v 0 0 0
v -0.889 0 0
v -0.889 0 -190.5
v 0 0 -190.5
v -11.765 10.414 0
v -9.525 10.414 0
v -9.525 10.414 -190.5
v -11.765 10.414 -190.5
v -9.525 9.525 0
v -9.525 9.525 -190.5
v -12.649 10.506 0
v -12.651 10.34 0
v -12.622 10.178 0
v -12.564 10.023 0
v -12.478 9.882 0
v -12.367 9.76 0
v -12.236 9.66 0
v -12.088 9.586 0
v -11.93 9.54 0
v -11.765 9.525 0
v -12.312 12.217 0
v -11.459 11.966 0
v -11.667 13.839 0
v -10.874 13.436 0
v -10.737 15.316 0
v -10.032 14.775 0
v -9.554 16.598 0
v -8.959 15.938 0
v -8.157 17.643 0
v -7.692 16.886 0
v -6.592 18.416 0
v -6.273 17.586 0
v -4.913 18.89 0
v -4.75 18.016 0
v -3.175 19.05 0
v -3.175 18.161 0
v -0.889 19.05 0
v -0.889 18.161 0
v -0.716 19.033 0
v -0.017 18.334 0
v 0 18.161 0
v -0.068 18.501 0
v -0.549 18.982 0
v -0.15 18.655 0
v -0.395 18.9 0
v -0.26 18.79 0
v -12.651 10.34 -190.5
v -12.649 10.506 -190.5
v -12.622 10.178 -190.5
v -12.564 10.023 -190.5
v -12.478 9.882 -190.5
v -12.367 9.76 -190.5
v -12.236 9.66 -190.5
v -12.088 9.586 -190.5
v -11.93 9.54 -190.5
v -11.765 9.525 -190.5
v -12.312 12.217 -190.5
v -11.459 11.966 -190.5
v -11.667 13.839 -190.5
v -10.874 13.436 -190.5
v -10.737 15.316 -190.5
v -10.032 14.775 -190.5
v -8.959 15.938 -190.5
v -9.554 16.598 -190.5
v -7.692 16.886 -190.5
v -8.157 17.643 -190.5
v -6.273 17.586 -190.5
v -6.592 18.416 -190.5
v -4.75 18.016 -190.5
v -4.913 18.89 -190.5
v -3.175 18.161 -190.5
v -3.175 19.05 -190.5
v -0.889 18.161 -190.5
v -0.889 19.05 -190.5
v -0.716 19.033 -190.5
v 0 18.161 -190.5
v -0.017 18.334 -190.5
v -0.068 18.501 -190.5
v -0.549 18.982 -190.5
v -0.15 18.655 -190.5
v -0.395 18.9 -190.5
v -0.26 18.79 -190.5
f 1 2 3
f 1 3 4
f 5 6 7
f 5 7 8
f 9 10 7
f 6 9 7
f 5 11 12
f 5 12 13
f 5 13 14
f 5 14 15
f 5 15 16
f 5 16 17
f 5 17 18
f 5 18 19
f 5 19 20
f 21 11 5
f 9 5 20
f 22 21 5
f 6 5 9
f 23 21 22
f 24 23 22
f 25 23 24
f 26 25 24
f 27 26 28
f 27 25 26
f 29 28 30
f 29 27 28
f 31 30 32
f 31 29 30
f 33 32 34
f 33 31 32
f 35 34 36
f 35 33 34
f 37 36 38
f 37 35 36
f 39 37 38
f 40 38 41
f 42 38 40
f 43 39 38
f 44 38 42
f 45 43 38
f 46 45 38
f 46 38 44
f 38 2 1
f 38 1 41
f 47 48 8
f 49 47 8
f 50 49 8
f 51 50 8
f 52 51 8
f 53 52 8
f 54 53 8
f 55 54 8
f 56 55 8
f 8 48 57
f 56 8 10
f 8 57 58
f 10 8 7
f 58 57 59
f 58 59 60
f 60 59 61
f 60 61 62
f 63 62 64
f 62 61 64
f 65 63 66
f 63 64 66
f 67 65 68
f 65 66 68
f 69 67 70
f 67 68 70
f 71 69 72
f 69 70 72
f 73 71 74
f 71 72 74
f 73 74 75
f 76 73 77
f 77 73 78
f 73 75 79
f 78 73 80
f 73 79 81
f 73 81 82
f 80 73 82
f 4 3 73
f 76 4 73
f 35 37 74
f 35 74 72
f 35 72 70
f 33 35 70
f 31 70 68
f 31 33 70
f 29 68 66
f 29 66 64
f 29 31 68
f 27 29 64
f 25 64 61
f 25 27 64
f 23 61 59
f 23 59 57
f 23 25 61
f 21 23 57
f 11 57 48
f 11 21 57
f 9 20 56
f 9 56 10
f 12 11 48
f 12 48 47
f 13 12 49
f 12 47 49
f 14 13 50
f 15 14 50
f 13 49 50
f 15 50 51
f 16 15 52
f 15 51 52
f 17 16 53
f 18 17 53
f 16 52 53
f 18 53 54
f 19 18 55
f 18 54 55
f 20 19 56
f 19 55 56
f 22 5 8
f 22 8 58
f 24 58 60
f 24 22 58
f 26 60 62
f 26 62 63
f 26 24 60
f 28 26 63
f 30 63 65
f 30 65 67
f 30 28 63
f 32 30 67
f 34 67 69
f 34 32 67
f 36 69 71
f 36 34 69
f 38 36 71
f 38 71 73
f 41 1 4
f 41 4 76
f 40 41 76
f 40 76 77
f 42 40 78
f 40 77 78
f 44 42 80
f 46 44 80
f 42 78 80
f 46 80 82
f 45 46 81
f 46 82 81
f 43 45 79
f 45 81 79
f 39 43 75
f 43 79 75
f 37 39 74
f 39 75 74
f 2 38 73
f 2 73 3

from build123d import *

# Parameters (mm, degrees)
EXTRUDE_THIN1_DEPTH = 190.5
FILLET1_R           = 0.889


with BuildPart() as part:
    # Sketch1 → Extrude-Thin1 (new body)
    with BuildSketch(Plane.XY):
        with BuildLine():
            Line((0, 0), (0, 19.05))
            Line((0, 19.05), (-3.175, 19.05))
            ThreePointArc((-3.175, 19.05), (-9.910192091, 16.260192091), (-12.7, 9.525))
            Line((-12.7, 9.525), (-9.525, 9.525))
            Line((-9.525, 9.525), (-9.525, 10.414))
            Line((-9.525, 10.414), (-11.765120779, 10.414))
            ThreePointArc((-11.765120779, 10.414), (-8.958731149, 15.938185636), (-3.175, 18.161))
            Line((-3.175, 18.161), (-0.889, 18.161))
            Line((-0.889, 18.161), (-0.889, 0))
            Line((-0.889, 0), (0, 0))
        make_face()
    extrude(amount=-EXTRUDE_THIN1_DEPTH)

    # Fillet1
    fillet1_edges = [part.edges().sort_by_distance(p)[0] for p in [
        (-12.7, 9.525, -95.25),
        (0, 19.05, -95.25),
    ]]
    fillet(fillet1_edges, radius=FILLET1_R)


solid = part.part
